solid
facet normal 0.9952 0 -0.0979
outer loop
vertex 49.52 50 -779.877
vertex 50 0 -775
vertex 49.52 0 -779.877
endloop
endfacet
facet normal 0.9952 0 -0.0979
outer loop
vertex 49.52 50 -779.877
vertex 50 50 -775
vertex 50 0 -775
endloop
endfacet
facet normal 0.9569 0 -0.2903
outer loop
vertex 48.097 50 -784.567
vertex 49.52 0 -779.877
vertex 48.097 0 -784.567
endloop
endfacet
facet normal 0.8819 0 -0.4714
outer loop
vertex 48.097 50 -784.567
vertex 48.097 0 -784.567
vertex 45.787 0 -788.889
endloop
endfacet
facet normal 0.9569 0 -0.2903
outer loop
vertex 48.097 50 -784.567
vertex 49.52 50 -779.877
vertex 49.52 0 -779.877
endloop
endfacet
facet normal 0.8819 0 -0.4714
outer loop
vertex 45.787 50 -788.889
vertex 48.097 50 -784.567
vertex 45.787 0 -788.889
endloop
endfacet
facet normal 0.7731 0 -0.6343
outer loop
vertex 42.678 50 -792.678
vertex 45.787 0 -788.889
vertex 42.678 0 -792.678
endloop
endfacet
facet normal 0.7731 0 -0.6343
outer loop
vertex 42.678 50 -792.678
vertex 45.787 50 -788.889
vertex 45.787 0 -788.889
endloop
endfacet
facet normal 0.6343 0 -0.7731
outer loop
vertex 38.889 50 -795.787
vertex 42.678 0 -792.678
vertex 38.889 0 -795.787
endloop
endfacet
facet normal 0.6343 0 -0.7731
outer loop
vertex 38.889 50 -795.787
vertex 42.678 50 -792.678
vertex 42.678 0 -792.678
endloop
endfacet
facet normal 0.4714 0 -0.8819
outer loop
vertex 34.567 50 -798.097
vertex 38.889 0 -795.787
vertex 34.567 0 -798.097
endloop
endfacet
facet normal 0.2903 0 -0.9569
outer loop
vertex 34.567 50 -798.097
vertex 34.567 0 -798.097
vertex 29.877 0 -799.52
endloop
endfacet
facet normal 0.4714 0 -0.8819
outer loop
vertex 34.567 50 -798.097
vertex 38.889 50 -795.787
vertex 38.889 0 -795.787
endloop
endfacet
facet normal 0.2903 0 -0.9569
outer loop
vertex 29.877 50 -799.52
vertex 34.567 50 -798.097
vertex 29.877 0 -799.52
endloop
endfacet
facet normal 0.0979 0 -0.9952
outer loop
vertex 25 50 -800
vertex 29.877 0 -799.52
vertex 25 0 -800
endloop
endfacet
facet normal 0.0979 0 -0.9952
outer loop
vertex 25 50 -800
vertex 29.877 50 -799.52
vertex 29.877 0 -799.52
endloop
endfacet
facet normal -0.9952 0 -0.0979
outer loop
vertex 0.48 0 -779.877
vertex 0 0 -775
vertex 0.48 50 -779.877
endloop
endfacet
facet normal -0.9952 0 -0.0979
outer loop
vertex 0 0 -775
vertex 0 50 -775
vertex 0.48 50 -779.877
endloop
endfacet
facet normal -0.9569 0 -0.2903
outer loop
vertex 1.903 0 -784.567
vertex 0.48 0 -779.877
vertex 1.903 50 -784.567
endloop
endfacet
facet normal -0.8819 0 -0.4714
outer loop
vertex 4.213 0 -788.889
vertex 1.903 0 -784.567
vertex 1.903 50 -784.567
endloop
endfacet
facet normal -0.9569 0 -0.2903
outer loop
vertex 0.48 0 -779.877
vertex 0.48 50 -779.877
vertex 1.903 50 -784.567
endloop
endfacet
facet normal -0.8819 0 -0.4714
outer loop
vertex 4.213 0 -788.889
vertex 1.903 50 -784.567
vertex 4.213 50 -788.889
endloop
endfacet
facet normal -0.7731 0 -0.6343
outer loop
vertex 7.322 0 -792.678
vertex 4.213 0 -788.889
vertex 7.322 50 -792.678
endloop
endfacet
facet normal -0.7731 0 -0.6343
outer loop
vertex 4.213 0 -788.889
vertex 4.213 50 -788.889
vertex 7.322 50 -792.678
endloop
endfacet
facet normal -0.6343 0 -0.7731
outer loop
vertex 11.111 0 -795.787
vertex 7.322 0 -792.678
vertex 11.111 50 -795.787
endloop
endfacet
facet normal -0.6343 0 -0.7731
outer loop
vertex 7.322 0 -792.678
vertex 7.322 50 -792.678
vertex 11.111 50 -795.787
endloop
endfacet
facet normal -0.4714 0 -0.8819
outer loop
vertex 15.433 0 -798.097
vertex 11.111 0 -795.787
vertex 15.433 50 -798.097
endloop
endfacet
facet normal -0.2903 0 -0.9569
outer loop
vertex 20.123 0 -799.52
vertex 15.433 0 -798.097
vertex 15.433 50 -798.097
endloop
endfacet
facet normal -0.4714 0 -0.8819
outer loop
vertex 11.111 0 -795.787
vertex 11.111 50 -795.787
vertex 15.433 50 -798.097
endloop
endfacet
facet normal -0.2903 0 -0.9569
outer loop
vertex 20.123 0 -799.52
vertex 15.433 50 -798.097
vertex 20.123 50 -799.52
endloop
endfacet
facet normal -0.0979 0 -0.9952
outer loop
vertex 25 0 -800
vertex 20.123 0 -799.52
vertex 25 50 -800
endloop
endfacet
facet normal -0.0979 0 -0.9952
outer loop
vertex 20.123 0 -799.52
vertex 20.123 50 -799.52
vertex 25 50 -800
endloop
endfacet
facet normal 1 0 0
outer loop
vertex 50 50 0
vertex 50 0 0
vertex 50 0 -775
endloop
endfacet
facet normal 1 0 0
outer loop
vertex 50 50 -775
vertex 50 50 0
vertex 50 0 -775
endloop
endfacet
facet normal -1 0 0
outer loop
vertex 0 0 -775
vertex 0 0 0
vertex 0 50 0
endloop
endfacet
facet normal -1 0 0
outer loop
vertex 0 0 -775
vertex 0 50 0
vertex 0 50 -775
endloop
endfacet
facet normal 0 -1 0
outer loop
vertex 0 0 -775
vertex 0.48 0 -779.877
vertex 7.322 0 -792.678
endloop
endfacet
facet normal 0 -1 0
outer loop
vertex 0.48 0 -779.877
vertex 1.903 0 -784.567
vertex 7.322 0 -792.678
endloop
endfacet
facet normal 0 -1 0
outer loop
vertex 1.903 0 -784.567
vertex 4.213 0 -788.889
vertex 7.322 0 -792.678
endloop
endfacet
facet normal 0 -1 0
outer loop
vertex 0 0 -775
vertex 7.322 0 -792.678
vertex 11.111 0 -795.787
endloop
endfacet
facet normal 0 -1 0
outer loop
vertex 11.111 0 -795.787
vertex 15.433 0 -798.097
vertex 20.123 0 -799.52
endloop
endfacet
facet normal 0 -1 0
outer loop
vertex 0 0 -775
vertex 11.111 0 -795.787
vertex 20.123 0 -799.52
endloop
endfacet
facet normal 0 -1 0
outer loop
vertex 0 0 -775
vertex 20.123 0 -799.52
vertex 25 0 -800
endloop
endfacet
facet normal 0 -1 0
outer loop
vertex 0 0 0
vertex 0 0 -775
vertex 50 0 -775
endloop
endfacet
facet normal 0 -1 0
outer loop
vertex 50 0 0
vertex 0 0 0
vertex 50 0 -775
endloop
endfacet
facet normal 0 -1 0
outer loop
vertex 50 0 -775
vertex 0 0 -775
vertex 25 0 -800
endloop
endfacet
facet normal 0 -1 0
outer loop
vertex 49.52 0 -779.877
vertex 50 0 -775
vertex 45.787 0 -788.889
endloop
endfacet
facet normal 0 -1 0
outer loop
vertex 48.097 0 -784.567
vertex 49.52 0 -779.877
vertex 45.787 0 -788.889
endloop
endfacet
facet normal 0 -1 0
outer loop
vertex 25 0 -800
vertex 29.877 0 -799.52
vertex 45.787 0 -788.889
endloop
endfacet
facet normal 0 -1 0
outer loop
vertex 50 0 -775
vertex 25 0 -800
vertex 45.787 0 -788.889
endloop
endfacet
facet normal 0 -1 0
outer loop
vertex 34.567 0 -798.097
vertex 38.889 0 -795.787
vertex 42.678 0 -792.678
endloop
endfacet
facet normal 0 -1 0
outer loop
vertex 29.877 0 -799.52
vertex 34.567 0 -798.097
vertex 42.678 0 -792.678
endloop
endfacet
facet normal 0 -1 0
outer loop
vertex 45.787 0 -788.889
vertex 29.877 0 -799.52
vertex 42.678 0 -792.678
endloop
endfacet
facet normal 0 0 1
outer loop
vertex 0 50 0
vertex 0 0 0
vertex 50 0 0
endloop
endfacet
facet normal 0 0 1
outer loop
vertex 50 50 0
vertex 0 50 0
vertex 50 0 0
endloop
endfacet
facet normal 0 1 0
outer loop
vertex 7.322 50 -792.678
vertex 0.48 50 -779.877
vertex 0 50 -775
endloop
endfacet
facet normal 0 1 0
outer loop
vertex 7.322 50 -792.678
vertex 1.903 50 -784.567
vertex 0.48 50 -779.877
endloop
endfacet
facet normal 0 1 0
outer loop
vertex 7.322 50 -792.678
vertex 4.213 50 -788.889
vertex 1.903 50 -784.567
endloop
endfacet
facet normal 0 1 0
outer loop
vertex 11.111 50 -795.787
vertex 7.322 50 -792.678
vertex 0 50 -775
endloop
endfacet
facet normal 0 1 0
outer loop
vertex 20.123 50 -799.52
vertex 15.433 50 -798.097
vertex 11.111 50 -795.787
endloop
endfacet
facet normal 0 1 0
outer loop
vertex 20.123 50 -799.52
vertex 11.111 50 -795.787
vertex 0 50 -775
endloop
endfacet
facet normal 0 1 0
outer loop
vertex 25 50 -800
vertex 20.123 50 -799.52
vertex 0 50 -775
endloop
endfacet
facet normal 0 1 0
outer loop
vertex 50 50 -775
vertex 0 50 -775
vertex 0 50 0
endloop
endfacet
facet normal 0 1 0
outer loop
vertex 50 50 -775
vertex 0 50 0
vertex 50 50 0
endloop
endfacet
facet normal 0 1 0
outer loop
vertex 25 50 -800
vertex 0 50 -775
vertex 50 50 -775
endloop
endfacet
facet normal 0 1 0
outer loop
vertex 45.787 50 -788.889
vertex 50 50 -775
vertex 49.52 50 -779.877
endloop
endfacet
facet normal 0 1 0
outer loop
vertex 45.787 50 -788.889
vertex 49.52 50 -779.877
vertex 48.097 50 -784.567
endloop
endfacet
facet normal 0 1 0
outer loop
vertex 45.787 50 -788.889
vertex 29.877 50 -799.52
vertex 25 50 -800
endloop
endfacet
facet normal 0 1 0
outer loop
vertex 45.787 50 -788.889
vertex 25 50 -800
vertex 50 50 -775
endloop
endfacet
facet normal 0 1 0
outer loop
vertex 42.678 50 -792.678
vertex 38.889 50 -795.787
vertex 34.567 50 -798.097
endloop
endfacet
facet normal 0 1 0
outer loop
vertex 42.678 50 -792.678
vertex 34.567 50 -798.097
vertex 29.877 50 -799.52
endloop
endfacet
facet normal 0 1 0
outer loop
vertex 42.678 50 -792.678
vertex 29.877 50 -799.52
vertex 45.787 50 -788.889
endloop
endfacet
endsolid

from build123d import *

# Parameters (mm, degrees)
SKETCH_1_W      = 50
SKETCH_1_H      = 800
EXTRUDE_1_DEPTH = 50
FILLET_1_R      = 25


with BuildPart() as part:
    # 草图1 → 凸台-拉伸1 (new body)
    with BuildSketch(Plane(origin=(0, 0, 0), x_dir=(1, 0, 0), z_dir=(0, 1, 0))):
        with Locations((25, 400)):
            Rectangle(SKETCH_1_W, SKETCH_1_H)
    extrude(amount=EXTRUDE_1_DEPTH)

    # 圆角1
    fillet_1_edges = [part.edges().sort_by_distance(p)[0] for p in [
        (0, 25, -800),
        (50, 25, -800),
    ]]
    fillet(fillet_1_edges, radius=FILLET_1_R - 0.0001)  # a hair under: the kernel refuses the full size


solid = part.part
